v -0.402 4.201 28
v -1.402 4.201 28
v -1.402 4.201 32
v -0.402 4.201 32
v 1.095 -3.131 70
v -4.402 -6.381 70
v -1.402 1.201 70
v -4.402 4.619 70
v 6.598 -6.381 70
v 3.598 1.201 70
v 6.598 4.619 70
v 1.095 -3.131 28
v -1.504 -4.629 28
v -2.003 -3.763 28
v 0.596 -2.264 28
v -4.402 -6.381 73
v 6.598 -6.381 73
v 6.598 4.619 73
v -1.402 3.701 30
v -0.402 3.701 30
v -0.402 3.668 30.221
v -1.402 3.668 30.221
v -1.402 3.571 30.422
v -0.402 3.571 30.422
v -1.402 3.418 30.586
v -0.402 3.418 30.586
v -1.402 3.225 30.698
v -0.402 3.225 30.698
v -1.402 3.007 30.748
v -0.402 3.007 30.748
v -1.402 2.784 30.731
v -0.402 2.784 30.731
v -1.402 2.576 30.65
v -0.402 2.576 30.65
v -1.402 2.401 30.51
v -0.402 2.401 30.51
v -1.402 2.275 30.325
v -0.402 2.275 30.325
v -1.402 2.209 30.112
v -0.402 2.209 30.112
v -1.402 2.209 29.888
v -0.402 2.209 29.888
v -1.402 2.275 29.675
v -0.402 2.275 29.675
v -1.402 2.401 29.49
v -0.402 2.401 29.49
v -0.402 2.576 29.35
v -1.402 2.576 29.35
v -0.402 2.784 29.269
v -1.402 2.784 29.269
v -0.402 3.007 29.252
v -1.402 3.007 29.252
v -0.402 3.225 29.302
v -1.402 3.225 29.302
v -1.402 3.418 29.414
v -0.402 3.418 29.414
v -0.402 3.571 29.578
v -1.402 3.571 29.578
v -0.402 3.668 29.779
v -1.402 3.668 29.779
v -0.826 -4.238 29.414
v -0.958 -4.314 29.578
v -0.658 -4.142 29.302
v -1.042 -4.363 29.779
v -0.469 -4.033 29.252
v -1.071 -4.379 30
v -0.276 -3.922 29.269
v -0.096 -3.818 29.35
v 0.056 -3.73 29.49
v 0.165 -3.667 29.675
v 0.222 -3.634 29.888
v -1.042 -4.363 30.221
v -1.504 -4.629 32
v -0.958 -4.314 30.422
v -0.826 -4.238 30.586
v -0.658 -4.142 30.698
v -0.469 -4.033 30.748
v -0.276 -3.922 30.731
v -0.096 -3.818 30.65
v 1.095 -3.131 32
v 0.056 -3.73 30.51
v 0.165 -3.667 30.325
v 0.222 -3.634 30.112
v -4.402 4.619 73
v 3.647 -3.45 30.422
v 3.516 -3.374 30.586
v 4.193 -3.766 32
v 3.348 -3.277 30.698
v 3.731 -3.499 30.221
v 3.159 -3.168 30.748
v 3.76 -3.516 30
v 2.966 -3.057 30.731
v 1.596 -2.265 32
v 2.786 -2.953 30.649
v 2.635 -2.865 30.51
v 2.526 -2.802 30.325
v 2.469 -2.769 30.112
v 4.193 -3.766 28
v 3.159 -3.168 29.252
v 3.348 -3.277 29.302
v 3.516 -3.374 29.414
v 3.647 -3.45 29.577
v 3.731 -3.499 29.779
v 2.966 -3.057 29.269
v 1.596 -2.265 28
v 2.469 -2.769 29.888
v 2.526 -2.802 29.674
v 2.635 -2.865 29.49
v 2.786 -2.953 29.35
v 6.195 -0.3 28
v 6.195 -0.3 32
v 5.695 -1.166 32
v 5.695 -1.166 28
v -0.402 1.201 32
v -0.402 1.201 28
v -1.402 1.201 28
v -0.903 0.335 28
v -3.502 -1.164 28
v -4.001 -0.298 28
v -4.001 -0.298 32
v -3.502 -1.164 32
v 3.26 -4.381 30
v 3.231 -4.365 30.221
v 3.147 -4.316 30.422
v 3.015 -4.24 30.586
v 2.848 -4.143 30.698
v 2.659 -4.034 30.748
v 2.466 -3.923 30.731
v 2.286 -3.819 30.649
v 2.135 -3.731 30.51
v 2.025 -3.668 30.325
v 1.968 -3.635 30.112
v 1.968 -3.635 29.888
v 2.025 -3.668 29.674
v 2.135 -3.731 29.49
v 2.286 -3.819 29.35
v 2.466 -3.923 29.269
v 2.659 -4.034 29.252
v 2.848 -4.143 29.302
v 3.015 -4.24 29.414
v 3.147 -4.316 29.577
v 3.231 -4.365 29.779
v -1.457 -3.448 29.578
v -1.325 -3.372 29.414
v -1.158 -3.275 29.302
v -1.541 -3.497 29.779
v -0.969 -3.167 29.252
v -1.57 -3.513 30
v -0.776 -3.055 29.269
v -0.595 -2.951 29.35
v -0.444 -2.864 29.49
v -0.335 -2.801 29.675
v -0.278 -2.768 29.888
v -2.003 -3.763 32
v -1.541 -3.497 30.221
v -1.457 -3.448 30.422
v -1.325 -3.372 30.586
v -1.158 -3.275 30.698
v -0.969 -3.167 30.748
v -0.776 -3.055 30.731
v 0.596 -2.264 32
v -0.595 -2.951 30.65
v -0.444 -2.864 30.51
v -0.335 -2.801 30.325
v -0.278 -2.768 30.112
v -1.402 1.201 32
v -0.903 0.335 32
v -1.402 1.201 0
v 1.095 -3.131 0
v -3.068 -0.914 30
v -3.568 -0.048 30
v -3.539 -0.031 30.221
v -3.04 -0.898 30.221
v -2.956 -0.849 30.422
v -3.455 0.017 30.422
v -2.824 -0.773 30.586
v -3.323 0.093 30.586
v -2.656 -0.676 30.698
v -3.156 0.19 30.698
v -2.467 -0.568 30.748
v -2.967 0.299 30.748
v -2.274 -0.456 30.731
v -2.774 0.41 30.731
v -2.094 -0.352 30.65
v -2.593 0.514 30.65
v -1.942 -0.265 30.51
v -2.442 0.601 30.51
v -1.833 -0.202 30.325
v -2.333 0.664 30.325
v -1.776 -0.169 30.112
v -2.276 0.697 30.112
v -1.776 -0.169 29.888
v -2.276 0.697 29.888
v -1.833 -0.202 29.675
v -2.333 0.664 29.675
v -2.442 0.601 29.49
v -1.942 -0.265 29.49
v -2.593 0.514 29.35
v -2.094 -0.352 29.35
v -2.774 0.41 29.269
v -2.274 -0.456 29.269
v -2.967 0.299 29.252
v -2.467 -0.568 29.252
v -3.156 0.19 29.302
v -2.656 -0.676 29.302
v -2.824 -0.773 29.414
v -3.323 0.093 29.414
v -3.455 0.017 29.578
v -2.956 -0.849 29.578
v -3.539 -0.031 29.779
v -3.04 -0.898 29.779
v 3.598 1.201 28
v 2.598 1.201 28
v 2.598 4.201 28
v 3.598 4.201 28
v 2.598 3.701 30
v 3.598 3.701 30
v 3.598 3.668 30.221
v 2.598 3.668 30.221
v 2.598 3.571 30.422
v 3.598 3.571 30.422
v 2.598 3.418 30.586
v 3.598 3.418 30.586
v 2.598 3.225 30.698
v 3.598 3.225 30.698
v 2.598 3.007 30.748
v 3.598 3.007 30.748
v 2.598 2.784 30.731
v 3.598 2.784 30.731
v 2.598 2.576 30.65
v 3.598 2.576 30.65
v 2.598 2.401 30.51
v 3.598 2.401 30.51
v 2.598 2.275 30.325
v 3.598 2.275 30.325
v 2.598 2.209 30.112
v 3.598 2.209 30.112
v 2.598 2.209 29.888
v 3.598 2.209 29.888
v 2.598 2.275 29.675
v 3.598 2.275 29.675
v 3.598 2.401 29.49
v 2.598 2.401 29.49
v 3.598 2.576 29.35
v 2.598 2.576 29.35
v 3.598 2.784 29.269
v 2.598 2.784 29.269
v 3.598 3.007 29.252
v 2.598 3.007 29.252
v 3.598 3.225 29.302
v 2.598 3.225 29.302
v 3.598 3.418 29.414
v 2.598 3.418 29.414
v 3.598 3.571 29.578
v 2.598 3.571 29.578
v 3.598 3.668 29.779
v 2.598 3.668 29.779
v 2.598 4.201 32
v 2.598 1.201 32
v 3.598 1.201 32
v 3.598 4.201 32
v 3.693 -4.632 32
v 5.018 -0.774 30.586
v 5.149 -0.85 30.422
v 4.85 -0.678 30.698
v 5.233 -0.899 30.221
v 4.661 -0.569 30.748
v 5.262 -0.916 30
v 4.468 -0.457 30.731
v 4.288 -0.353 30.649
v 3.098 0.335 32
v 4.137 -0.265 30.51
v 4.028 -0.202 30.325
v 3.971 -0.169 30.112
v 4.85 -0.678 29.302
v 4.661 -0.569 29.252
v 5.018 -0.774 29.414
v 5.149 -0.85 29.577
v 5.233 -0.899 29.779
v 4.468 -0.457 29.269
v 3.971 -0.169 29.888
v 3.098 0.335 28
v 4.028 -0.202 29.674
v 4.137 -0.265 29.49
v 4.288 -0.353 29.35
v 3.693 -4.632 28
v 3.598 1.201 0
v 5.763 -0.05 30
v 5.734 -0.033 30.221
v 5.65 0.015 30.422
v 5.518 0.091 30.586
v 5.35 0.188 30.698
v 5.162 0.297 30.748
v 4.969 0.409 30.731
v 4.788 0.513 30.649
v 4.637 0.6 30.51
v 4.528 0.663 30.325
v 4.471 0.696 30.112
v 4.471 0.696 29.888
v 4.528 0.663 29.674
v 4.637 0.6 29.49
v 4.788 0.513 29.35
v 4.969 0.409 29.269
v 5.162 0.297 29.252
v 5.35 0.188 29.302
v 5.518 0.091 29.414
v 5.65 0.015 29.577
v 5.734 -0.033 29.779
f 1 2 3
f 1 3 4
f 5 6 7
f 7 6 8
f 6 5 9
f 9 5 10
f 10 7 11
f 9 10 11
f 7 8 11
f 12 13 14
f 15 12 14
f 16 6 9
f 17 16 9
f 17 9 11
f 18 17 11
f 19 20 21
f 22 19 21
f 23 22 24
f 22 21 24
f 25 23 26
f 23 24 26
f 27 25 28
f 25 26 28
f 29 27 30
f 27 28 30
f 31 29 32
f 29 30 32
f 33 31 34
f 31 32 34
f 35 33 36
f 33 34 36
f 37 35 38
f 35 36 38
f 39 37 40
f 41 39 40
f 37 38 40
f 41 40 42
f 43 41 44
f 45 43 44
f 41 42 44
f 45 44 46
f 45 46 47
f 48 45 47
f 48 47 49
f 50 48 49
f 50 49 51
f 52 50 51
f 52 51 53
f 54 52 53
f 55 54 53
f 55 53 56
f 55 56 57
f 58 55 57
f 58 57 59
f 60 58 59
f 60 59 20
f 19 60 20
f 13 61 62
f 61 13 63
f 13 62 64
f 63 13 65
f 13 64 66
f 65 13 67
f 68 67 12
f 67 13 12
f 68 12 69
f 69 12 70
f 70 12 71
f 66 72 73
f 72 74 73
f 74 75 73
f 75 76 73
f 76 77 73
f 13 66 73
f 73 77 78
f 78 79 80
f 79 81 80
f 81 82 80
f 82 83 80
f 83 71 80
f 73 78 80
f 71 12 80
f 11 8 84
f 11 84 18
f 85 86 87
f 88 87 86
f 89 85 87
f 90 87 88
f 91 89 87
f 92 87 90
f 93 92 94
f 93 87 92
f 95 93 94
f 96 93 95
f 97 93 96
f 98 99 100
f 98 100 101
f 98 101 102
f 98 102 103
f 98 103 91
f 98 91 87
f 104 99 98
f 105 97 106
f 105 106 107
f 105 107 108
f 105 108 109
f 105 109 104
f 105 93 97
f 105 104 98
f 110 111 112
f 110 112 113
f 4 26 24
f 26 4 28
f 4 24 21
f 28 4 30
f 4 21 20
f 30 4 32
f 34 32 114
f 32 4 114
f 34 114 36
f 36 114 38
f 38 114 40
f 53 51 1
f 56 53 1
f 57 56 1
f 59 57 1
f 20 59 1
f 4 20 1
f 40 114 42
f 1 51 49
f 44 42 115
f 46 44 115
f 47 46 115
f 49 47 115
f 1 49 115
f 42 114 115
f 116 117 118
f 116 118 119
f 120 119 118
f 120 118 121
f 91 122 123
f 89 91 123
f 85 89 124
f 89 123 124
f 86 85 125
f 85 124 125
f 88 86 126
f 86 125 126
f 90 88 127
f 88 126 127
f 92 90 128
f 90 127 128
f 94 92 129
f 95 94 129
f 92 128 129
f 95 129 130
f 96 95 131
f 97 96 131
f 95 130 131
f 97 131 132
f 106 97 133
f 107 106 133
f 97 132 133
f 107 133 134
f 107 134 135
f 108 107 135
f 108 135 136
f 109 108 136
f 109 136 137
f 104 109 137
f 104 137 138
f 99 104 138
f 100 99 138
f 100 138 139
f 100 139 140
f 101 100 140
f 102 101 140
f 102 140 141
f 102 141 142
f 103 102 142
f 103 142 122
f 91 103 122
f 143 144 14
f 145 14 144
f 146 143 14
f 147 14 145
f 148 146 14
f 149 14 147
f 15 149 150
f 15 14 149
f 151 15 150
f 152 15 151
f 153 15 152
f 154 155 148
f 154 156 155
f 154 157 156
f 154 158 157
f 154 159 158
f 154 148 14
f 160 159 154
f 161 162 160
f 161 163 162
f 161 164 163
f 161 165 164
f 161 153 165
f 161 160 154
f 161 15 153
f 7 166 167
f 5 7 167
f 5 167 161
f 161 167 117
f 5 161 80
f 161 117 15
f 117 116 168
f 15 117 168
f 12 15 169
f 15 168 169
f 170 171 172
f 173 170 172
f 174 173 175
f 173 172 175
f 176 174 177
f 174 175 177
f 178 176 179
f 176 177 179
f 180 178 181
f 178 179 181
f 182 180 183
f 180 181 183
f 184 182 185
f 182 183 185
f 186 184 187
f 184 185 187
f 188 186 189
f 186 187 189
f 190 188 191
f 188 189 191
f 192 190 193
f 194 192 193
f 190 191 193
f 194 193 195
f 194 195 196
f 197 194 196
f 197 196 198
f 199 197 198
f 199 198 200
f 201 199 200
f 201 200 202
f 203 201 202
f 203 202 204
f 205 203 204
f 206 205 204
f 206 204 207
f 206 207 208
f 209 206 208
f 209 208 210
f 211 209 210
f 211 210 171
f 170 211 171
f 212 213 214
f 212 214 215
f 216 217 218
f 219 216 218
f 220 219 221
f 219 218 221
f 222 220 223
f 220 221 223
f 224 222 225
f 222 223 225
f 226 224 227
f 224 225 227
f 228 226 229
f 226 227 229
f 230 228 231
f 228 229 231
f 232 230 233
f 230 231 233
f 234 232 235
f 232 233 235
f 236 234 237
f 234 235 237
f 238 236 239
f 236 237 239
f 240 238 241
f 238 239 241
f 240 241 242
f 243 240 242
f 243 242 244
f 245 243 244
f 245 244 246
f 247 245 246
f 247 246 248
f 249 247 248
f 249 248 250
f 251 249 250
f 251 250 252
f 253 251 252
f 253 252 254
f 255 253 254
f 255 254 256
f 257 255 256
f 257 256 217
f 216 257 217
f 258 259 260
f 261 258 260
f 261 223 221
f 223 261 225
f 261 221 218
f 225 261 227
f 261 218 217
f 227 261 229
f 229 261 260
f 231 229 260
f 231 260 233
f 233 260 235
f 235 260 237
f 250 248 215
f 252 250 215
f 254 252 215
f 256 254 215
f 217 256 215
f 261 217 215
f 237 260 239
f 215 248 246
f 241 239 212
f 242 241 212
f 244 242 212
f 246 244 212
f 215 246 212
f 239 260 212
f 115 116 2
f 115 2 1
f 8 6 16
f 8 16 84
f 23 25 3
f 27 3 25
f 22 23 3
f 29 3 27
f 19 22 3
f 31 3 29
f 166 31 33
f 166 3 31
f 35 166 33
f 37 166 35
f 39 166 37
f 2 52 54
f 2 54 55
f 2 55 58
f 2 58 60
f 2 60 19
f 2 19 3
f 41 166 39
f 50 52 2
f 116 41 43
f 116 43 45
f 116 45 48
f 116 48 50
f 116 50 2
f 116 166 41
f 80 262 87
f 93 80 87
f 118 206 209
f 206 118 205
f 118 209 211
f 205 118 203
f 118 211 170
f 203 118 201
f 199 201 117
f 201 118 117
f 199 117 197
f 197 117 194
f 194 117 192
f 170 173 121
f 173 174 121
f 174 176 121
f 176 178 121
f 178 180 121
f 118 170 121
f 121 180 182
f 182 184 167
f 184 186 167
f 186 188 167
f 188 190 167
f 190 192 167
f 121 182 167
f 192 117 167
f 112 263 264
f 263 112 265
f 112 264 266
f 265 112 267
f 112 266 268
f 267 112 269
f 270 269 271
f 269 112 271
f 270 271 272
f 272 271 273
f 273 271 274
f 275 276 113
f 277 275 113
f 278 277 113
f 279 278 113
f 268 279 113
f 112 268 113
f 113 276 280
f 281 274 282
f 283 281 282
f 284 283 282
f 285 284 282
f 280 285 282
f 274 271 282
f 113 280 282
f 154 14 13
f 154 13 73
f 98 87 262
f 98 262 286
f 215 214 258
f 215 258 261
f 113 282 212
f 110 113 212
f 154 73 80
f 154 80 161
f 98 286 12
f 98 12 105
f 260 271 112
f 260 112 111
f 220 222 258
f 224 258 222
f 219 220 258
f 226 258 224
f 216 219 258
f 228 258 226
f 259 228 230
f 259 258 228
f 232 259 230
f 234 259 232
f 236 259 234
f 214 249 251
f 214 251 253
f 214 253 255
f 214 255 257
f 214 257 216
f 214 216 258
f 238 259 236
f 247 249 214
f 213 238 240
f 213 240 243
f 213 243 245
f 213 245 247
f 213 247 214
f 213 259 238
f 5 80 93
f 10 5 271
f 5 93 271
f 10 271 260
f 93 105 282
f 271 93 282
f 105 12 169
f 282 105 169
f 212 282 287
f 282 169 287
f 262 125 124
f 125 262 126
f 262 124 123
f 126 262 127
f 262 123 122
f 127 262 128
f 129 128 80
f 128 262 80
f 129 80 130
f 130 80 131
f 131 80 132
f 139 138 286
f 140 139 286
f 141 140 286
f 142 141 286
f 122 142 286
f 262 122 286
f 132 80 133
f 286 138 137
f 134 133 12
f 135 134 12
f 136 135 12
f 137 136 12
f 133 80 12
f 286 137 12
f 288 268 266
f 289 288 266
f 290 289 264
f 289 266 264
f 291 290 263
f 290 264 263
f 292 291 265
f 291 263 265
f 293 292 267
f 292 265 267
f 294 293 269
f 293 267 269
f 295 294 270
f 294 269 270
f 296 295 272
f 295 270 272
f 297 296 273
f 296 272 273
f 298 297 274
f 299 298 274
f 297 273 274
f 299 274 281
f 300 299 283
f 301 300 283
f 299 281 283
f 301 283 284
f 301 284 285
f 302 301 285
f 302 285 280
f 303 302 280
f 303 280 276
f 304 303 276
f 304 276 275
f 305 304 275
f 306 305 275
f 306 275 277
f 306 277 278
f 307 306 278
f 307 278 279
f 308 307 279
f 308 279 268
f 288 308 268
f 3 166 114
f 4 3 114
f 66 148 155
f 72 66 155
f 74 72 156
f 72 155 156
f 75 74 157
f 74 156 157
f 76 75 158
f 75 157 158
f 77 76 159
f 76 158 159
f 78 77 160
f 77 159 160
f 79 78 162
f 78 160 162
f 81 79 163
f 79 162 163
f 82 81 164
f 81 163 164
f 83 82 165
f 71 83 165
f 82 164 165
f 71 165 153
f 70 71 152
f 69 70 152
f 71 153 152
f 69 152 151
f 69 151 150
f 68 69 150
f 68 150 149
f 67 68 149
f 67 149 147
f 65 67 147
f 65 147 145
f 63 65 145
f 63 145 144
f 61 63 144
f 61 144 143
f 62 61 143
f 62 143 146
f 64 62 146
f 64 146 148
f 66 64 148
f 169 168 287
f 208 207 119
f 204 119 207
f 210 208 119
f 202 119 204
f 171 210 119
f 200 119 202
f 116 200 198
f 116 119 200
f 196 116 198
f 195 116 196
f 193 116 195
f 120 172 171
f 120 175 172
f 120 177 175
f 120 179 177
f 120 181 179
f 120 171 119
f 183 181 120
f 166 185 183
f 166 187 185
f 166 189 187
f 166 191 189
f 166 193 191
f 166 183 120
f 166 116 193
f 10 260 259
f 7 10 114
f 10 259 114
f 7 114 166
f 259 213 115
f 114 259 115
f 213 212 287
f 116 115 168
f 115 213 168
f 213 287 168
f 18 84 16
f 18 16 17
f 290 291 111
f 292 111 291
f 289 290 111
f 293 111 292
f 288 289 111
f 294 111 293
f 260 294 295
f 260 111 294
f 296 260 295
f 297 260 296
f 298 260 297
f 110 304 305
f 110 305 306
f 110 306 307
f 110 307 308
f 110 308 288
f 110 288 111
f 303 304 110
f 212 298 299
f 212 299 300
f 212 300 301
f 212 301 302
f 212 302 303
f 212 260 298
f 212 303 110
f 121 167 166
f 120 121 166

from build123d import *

# Parameters (mm, degrees)
BOSS_EXTRU_1_DEPTH      = 70
ESQUISSE3_W             = 1
ESQUISSE3_H             = 4
BOSS_EXTRU_2_DEPTH      = 3
ESQUISSE4_W             = 1
ESQUISSE4_H             = 4
BOSS_EXTRU_3_DEPTH      = 3
ESQUISSE6_R             = 0.75
ENL_V_MAT_EXTRU_1_DEPTH = 5
ESQUISSE7_W             = 4
ESQUISSE7_H             = 1
BOSS_EXTRU_4_DEPTH      = 3
ESQUISSE8_W             = 4
ESQUISSE8_H             = 1
BOSS_EXTRU_5_DEPTH      = 3
ESQUISSE9_R             = 0.75
ENL_V_MAT_EXTRU_2_DEPTH = 5.1
ESQUISSE10_W            = 4
ESQUISSE10_H            = 1
BOSS_EXTRU_6_DEPTH      = 3
ESQUISSE11_W            = 4
ESQUISSE11_H            = 1
BOSS_EXTRU_7_DEPTH      = 3
ESQUISSE12_R            = 0.75
ENL_V_MAT_EXTRU_3_DEPTH = 5.1
ESQUISSE13_W            = 11
ESQUISSE13_H            = 11
BOSS_EXTRU_8_DEPTH      = 3


with BuildPart() as part:
    # Esquisse1 → Boss.-Extru.1 (new body)
    with BuildSketch(Plane.XY):
        Polygon((-1.402144657, 1.200833509), (1.095290548, -3.130773283), (3.597855343, 1.200833509), align=None)
    extrude(amount=BOSS_EXTRU_1_DEPTH)

    # Esquisse3 → Boss.-Extru.2 (add)
    with BuildSketch(Plane(origin=(0, 1.200833509, 0), x_dir=(1, 0, 0), z_dir=(0, 1, 0))):
        with Locations((-0.902144657, -30)):
            Rectangle(ESQUISSE3_W, ESQUISSE3_H)
    extrude(amount=BOSS_EXTRU_2_DEPTH)

    # Esquisse4 → Boss.-Extru.3 (add)
    with BuildSketch(Plane(origin=(0, 1.200833509, 0), x_dir=(1, 0, 0), z_dir=(0, 1, 0))):
        with Locations((3.097855343, -30)):
            Rectangle(ESQUISSE4_W, ESQUISSE4_H)
    extrude(amount=BOSS_EXTRU_3_DEPTH)

    # Esquisse6 → Enlèv. mat.-Extru.1 (cut)
    with BuildSketch(Plane(origin=(3.597855343, 0, 0), x_dir=(0, 0, -1), z_dir=(1, 0, 0))):
        with Locations(Location((-30, 2.950833509, 0), (0, 0, 90))):
            Circle(ESQUISSE6_R)
    extrude(amount=-ENL_V_MAT_EXTRU_1_DEPTH, mode=Mode.SUBTRACT)

    # Esquisse7 → Boss.-Extru.4 (add)
    with BuildSketch(Plane(origin=(2.177314873, -1.257933098, 0), x_dir=(0, 0, -1), z_dir=(0.8658773126093765, -0.5002564137603478, 0))):
        with Locations((-29.999890103, 2.339624703)):
            Rectangle(ESQUISSE7_W, ESQUISSE7_H)
    extrude(amount=BOSS_EXTRU_4_DEPTH)

    # Esquisse8 → Boss.-Extru.5 (add)
    with BuildSketch(Plane(origin=(2.177314873, -1.257933098, 0), x_dir=(0, 0, -1), z_dir=(0.8658773126093764, -0.5002564137603477, 0))):
        with Locations((-29.999890103, -1.662939435)):
            Rectangle(ESQUISSE8_W, ESQUISSE8_H)
    extrude(amount=BOSS_EXTRU_5_DEPTH)

    # Esquisse9 → Enlèv. mat.-Extru.2 (cut)
    with BuildSketch(Plane(origin=(-1.082024325, -1.872840185, 0), x_dir=(-0.8658773126093765, 0.5002564137603478, 0), z_dir=(-0.5002564137603477, -0.8658773126093764, 0))):
        with Locations(Location((-4.264576651, -29.999890103, 0), (0, 0, 180))):
            Circle(ESQUISSE9_R)
    extrude(amount=-ENL_V_MAT_EXTRU_2_DEPTH, mode=Mode.SUBTRACT)

    # Esquisse10 → Boss.-Extru.6 (add)
    with BuildSketch(Plane(origin=(-0.532707143, -0.307138122, 0), x_dir=(0, 0, 1), z_dir=(-0.8663213583248282, -0.499487040983272, 0))):
        with Locations((29.999890103, -2.759339198)):
            Rectangle(ESQUISSE10_W, ESQUISSE10_H)
    extrude(amount=BOSS_EXTRU_6_DEPTH)

    # Esquisse11 → Boss.-Extru.7 (add)
    with BuildSketch(Plane(origin=(-0.532707143, -0.307138122, 0), x_dir=(0, 0, 1), z_dir=(-0.8663213583248282, -0.499487040983272, 0))):
        with Locations((30, 1.240660802)):
            Rectangle(ESQUISSE11_W, ESQUISSE11_H)
    extrude(amount=BOSS_EXTRU_7_DEPTH)

    # Esquisse12 → Enlèv. mat.-Extru.3 (cut)
    with BuildSketch(Plane(origin=(-0.869437513, 1.50797163, 0), x_dir=(0.866321358324828, 0.499487040983272, 0), z_dir=(-0.499487040983272, 0.866321358324828, 0))):
        with Locations(Location((-2.364907088, -30, 0), (0, 0, 180))):
            Circle(ESQUISSE12_R)
    extrude(amount=-ENL_V_MAT_EXTRU_3_DEPTH, mode=Mode.SUBTRACT)

    # Esquisse13 → Boss.-Extru.8 (add)
    with BuildSketch(Plane.XY.offset(70)):
        with Locations((1.097855343, -0.880773283)):
            Rectangle(ESQUISSE13_W, ESQUISSE13_H)
    extrude(amount=BOSS_EXTRU_8_DEPTH)


solid = part.part
